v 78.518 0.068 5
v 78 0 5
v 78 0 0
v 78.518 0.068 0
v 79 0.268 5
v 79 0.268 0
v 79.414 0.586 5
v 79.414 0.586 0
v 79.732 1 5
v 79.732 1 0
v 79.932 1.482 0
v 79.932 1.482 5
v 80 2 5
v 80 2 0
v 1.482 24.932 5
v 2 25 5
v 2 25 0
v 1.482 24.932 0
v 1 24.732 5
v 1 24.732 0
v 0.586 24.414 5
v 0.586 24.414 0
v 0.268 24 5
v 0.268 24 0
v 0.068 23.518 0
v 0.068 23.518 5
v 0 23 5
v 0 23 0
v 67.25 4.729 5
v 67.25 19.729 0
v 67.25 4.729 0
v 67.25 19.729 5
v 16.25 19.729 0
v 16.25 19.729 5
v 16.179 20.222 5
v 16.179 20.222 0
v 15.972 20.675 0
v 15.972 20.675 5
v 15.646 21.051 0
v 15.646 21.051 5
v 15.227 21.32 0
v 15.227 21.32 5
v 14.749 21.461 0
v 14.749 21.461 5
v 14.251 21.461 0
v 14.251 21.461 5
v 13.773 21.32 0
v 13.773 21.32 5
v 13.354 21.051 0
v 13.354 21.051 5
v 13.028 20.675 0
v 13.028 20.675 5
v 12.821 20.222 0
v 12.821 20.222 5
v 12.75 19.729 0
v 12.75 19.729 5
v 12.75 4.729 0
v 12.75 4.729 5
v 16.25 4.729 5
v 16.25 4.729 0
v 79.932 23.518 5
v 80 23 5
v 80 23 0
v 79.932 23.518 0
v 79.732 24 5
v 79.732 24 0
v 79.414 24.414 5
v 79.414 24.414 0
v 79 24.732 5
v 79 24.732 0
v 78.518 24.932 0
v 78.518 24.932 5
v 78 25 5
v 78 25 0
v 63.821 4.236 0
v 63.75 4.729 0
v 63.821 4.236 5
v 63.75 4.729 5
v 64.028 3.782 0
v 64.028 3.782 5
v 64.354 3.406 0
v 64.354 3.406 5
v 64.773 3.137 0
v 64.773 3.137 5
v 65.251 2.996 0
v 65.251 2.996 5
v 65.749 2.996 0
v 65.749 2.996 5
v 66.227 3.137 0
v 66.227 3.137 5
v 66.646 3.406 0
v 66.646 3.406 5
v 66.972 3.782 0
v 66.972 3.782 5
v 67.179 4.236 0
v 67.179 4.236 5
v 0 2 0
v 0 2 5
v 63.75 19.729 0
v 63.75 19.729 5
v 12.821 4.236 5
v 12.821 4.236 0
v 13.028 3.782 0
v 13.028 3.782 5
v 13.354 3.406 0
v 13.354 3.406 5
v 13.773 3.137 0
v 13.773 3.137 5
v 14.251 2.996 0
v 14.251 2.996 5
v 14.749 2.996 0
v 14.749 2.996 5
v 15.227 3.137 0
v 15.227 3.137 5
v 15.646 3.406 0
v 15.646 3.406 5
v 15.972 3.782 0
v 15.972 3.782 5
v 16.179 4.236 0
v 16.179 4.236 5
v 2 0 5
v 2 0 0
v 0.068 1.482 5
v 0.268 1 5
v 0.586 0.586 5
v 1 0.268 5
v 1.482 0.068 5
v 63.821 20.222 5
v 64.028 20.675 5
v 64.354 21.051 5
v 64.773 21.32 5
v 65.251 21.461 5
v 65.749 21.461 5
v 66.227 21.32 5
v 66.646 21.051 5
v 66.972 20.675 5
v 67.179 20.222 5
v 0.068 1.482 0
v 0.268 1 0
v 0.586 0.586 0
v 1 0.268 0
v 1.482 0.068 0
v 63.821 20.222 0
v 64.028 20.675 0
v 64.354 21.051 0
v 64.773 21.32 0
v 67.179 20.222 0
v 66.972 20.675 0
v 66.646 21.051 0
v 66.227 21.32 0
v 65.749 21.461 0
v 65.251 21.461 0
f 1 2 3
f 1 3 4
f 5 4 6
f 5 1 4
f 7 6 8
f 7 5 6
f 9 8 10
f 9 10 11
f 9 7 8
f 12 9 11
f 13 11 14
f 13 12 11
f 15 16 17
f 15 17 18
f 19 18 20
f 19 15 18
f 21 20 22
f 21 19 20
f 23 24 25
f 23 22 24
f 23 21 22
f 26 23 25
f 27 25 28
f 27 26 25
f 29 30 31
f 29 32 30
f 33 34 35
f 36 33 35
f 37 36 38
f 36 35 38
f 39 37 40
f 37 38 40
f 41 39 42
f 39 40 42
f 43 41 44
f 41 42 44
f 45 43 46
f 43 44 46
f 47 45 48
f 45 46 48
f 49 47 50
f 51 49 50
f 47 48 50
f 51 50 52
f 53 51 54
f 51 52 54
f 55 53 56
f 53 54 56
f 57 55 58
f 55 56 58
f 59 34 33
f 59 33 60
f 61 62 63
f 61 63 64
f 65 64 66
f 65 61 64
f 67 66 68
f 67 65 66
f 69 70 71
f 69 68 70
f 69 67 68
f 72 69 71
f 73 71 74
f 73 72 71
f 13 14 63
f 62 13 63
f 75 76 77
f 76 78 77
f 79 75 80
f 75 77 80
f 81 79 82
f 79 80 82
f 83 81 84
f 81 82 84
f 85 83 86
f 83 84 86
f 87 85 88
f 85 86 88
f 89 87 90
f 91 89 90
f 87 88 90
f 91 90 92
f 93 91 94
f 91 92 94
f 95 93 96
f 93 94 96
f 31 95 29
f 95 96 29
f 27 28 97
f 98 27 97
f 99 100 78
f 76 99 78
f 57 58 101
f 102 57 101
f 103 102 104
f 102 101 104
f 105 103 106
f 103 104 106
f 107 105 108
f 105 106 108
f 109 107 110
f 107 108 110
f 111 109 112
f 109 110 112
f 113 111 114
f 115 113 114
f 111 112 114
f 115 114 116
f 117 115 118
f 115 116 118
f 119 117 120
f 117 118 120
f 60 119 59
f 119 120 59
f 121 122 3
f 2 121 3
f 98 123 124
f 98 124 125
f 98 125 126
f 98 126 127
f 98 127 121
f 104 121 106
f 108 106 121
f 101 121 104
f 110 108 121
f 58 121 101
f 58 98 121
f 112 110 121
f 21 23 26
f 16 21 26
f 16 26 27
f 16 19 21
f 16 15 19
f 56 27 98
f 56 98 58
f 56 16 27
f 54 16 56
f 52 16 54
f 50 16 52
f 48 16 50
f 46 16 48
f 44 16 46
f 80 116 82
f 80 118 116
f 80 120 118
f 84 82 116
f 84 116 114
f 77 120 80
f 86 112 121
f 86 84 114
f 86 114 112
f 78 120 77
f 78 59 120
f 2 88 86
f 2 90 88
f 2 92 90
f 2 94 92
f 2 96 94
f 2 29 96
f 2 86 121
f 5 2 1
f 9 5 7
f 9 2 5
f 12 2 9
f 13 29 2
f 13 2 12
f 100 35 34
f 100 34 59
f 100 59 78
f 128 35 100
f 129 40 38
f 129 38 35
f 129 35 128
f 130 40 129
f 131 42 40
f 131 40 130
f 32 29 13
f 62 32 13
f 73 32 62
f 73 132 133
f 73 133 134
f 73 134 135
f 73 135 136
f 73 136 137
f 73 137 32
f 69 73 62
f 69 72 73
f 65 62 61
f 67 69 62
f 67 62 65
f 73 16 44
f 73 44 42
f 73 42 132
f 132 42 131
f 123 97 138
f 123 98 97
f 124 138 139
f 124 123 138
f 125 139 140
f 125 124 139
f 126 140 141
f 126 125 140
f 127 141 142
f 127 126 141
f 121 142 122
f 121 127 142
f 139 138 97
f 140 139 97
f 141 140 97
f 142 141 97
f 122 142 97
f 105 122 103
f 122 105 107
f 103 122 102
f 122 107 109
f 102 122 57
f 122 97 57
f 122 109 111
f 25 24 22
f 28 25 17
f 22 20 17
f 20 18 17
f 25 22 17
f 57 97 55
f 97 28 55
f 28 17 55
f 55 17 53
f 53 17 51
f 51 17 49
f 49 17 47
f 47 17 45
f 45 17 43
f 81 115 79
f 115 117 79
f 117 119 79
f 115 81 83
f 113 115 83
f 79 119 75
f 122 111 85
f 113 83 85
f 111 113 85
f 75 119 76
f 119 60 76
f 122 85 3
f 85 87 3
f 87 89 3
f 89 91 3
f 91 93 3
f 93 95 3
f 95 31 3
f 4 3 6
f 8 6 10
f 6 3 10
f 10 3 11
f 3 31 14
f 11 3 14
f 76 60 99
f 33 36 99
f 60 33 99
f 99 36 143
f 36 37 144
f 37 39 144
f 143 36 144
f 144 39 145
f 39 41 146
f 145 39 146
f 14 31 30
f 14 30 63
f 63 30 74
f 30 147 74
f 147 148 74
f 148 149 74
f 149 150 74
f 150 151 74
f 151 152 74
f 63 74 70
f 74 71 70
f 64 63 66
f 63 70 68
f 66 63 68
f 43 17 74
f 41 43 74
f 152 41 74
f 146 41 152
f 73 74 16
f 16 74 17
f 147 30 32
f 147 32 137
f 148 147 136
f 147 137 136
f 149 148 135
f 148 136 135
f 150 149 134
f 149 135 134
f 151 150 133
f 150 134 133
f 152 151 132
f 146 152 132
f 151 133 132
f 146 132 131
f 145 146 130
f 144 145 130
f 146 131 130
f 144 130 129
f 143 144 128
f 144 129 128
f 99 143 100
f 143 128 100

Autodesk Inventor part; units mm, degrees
ref_plane "YZ Plane" through (0, 0, 0) normal (1, 0, 0) x (0, 1, 0)
ref_plane "XZ Plane" through (0, 0, 0) normal (0, 1, 0) x (-1, 0, 0)
ref_plane "XY Plane" through (0, 0, 0) normal (0, 0, 1) x (1, 0, 0)
sketch "Sketch1" plane through (0, 0, 0) normal (0, 0, 1) x (1, 0, 0)
  line L0 (0, 0) -> (80, 0)
  line L1 (80, 0) -> (80, 25)
  line L2 (80, 25) -> (0, 25)
  line L3 (0, 25) -> (0, 0)
  point P0 (14.5, 19.7286)
  point P1 (14.5, 4.7286)
  point P2 (65.5, 19.7286)
  point P3 (65.5, 4.7286)
  dimension "d0" = 80
  dimension "d1" = 25
  dimension "d2" = 14.5
  dimension "d3" = 51
  dimension "d4" = 15
extrude "Extrusion1" add sketch "Sketch1" along normal blind 5
sketch "Sketch2" plane through (0, 0, 0) normal (0, 0, 1) x (1, 0, 0)
  line L0 (0, 0) -> (80, 0)
  line L1 (80, 0) -> (80, 25)
  line L2 (80, 25) -> (0, 25)
  line L3 (0, 25) -> (0, 0)
  point P0 (14.5, 19.7286)
  point P1 (14.5, 4.7286)
  point P2 (65.5, 19.7286)
  point P3 (65.5, 4.7286)
  dimension "d5" = 80
  dimension "d6" = 25
  dimension "d7" = 14.5
  dimension "d8" = 51
  dimension "d9" = 15
hole "Hole1" at (14.5, 19.7286, 0) at (14.5, 4.7286, 0) at (65.5, 19.7286, 0) at (65.5, 4.7286, 0) direction (0, 0, 1) diameter 3.5 end through all
sketch "Sketch3" plane through (0, 0, 5) normal (0, 0, 1) x (1, 0, 0)
  circle A0 centre (14.5, 19.7286) radius 1.75 projected
  line L0 (16.25, 19.7286) -> (16.25, 4.7286)
  line L1 (12.75, 19.7286) -> (12.75, 4.7286)
  circle A1 centre (14.5, 4.7286) radius 1.75 projected
  circle A2 centre (65.5, 19.7286) radius 1.75 projected
  line L2 (63.75, 19.7286) -> (63.75, 4.7286)
  line L3 (67.25, 19.7286) -> (67.25, 4.7286)
  circle A3 centre (65.5, 4.7286) radius 1.75 projected
  circle A4 centre (65.5, 19.7286) radius 1.75 projected
  circle A5 centre (65.5, 4.7286) radius 1.75 projected
  circle A6 centre (14.5, 19.7286) radius 1.75 projected
  circle A7 centre (14.5, 4.7286) radius 1.75 projected
  point P0 (0, 0)
extrude "Extrusion2" cut sketch "Sketch3" against normal blind 5 contours L0 A1 L1 A0 | L3 A3 L2 A2
fillet "Fillet1" radius 2 4 edges at (80, 25, 2.5) (80, 0, 2.5) (0, 25, 2.5) (0, 0, 2.5)
sketch "Sketch4" plane through (0, 0, 5) normal (0, 0, 1) x (1, 0, 0)
  line L0 (63.75, 4.7286) -> (63.75, 19.7286) projected
  arc A0 (67.25, 19.7286) -> (63.75, 19.7286) centre (65.5, 19.7286) ccw projected
  line L1 (67.25, 19.7286) -> (67.25, 4.7286) projected
  arc A1 (63.75, 4.7286) -> (67.25, 4.7286) centre (65.5, 4.7286) ccw projected
  line L2 (12.75, 4.7286) -> (12.75, 19.7286) projected
  arc A2 (16.25, 19.7286) -> (12.75, 19.7286) centre (14.5, 19.7286) ccw projected
  line L3 (16.25, 19.7286) -> (16.25, 4.7286) projected
  arc A3 (12.75, 4.7286) -> (16.25, 4.7286) centre (14.5, 4.7286) ccw projected
  arc A4 (0, 2) -> (2, 0) centre (2, 2) ccw projected
  line L4 (2, 0) -> (78, 0) projected
  arc A5 (78, 0) -> (80, 2) centre (78, 2) ccw projected
  line L5 (80, 2) -> (80, 23) projected
  arc A6 (80, 23) -> (78, 25) centre (78, 23) ccw projected
  line L6 (78, 25) -> (2, 25) projected
  arc A7 (2, 25) -> (0, 23) centre (2, 23) ccw projected
  line L7 (0, 23) -> (0, 2) projected
  point P0 (0, 0)
properties part number "BasePatasVTOL2"
